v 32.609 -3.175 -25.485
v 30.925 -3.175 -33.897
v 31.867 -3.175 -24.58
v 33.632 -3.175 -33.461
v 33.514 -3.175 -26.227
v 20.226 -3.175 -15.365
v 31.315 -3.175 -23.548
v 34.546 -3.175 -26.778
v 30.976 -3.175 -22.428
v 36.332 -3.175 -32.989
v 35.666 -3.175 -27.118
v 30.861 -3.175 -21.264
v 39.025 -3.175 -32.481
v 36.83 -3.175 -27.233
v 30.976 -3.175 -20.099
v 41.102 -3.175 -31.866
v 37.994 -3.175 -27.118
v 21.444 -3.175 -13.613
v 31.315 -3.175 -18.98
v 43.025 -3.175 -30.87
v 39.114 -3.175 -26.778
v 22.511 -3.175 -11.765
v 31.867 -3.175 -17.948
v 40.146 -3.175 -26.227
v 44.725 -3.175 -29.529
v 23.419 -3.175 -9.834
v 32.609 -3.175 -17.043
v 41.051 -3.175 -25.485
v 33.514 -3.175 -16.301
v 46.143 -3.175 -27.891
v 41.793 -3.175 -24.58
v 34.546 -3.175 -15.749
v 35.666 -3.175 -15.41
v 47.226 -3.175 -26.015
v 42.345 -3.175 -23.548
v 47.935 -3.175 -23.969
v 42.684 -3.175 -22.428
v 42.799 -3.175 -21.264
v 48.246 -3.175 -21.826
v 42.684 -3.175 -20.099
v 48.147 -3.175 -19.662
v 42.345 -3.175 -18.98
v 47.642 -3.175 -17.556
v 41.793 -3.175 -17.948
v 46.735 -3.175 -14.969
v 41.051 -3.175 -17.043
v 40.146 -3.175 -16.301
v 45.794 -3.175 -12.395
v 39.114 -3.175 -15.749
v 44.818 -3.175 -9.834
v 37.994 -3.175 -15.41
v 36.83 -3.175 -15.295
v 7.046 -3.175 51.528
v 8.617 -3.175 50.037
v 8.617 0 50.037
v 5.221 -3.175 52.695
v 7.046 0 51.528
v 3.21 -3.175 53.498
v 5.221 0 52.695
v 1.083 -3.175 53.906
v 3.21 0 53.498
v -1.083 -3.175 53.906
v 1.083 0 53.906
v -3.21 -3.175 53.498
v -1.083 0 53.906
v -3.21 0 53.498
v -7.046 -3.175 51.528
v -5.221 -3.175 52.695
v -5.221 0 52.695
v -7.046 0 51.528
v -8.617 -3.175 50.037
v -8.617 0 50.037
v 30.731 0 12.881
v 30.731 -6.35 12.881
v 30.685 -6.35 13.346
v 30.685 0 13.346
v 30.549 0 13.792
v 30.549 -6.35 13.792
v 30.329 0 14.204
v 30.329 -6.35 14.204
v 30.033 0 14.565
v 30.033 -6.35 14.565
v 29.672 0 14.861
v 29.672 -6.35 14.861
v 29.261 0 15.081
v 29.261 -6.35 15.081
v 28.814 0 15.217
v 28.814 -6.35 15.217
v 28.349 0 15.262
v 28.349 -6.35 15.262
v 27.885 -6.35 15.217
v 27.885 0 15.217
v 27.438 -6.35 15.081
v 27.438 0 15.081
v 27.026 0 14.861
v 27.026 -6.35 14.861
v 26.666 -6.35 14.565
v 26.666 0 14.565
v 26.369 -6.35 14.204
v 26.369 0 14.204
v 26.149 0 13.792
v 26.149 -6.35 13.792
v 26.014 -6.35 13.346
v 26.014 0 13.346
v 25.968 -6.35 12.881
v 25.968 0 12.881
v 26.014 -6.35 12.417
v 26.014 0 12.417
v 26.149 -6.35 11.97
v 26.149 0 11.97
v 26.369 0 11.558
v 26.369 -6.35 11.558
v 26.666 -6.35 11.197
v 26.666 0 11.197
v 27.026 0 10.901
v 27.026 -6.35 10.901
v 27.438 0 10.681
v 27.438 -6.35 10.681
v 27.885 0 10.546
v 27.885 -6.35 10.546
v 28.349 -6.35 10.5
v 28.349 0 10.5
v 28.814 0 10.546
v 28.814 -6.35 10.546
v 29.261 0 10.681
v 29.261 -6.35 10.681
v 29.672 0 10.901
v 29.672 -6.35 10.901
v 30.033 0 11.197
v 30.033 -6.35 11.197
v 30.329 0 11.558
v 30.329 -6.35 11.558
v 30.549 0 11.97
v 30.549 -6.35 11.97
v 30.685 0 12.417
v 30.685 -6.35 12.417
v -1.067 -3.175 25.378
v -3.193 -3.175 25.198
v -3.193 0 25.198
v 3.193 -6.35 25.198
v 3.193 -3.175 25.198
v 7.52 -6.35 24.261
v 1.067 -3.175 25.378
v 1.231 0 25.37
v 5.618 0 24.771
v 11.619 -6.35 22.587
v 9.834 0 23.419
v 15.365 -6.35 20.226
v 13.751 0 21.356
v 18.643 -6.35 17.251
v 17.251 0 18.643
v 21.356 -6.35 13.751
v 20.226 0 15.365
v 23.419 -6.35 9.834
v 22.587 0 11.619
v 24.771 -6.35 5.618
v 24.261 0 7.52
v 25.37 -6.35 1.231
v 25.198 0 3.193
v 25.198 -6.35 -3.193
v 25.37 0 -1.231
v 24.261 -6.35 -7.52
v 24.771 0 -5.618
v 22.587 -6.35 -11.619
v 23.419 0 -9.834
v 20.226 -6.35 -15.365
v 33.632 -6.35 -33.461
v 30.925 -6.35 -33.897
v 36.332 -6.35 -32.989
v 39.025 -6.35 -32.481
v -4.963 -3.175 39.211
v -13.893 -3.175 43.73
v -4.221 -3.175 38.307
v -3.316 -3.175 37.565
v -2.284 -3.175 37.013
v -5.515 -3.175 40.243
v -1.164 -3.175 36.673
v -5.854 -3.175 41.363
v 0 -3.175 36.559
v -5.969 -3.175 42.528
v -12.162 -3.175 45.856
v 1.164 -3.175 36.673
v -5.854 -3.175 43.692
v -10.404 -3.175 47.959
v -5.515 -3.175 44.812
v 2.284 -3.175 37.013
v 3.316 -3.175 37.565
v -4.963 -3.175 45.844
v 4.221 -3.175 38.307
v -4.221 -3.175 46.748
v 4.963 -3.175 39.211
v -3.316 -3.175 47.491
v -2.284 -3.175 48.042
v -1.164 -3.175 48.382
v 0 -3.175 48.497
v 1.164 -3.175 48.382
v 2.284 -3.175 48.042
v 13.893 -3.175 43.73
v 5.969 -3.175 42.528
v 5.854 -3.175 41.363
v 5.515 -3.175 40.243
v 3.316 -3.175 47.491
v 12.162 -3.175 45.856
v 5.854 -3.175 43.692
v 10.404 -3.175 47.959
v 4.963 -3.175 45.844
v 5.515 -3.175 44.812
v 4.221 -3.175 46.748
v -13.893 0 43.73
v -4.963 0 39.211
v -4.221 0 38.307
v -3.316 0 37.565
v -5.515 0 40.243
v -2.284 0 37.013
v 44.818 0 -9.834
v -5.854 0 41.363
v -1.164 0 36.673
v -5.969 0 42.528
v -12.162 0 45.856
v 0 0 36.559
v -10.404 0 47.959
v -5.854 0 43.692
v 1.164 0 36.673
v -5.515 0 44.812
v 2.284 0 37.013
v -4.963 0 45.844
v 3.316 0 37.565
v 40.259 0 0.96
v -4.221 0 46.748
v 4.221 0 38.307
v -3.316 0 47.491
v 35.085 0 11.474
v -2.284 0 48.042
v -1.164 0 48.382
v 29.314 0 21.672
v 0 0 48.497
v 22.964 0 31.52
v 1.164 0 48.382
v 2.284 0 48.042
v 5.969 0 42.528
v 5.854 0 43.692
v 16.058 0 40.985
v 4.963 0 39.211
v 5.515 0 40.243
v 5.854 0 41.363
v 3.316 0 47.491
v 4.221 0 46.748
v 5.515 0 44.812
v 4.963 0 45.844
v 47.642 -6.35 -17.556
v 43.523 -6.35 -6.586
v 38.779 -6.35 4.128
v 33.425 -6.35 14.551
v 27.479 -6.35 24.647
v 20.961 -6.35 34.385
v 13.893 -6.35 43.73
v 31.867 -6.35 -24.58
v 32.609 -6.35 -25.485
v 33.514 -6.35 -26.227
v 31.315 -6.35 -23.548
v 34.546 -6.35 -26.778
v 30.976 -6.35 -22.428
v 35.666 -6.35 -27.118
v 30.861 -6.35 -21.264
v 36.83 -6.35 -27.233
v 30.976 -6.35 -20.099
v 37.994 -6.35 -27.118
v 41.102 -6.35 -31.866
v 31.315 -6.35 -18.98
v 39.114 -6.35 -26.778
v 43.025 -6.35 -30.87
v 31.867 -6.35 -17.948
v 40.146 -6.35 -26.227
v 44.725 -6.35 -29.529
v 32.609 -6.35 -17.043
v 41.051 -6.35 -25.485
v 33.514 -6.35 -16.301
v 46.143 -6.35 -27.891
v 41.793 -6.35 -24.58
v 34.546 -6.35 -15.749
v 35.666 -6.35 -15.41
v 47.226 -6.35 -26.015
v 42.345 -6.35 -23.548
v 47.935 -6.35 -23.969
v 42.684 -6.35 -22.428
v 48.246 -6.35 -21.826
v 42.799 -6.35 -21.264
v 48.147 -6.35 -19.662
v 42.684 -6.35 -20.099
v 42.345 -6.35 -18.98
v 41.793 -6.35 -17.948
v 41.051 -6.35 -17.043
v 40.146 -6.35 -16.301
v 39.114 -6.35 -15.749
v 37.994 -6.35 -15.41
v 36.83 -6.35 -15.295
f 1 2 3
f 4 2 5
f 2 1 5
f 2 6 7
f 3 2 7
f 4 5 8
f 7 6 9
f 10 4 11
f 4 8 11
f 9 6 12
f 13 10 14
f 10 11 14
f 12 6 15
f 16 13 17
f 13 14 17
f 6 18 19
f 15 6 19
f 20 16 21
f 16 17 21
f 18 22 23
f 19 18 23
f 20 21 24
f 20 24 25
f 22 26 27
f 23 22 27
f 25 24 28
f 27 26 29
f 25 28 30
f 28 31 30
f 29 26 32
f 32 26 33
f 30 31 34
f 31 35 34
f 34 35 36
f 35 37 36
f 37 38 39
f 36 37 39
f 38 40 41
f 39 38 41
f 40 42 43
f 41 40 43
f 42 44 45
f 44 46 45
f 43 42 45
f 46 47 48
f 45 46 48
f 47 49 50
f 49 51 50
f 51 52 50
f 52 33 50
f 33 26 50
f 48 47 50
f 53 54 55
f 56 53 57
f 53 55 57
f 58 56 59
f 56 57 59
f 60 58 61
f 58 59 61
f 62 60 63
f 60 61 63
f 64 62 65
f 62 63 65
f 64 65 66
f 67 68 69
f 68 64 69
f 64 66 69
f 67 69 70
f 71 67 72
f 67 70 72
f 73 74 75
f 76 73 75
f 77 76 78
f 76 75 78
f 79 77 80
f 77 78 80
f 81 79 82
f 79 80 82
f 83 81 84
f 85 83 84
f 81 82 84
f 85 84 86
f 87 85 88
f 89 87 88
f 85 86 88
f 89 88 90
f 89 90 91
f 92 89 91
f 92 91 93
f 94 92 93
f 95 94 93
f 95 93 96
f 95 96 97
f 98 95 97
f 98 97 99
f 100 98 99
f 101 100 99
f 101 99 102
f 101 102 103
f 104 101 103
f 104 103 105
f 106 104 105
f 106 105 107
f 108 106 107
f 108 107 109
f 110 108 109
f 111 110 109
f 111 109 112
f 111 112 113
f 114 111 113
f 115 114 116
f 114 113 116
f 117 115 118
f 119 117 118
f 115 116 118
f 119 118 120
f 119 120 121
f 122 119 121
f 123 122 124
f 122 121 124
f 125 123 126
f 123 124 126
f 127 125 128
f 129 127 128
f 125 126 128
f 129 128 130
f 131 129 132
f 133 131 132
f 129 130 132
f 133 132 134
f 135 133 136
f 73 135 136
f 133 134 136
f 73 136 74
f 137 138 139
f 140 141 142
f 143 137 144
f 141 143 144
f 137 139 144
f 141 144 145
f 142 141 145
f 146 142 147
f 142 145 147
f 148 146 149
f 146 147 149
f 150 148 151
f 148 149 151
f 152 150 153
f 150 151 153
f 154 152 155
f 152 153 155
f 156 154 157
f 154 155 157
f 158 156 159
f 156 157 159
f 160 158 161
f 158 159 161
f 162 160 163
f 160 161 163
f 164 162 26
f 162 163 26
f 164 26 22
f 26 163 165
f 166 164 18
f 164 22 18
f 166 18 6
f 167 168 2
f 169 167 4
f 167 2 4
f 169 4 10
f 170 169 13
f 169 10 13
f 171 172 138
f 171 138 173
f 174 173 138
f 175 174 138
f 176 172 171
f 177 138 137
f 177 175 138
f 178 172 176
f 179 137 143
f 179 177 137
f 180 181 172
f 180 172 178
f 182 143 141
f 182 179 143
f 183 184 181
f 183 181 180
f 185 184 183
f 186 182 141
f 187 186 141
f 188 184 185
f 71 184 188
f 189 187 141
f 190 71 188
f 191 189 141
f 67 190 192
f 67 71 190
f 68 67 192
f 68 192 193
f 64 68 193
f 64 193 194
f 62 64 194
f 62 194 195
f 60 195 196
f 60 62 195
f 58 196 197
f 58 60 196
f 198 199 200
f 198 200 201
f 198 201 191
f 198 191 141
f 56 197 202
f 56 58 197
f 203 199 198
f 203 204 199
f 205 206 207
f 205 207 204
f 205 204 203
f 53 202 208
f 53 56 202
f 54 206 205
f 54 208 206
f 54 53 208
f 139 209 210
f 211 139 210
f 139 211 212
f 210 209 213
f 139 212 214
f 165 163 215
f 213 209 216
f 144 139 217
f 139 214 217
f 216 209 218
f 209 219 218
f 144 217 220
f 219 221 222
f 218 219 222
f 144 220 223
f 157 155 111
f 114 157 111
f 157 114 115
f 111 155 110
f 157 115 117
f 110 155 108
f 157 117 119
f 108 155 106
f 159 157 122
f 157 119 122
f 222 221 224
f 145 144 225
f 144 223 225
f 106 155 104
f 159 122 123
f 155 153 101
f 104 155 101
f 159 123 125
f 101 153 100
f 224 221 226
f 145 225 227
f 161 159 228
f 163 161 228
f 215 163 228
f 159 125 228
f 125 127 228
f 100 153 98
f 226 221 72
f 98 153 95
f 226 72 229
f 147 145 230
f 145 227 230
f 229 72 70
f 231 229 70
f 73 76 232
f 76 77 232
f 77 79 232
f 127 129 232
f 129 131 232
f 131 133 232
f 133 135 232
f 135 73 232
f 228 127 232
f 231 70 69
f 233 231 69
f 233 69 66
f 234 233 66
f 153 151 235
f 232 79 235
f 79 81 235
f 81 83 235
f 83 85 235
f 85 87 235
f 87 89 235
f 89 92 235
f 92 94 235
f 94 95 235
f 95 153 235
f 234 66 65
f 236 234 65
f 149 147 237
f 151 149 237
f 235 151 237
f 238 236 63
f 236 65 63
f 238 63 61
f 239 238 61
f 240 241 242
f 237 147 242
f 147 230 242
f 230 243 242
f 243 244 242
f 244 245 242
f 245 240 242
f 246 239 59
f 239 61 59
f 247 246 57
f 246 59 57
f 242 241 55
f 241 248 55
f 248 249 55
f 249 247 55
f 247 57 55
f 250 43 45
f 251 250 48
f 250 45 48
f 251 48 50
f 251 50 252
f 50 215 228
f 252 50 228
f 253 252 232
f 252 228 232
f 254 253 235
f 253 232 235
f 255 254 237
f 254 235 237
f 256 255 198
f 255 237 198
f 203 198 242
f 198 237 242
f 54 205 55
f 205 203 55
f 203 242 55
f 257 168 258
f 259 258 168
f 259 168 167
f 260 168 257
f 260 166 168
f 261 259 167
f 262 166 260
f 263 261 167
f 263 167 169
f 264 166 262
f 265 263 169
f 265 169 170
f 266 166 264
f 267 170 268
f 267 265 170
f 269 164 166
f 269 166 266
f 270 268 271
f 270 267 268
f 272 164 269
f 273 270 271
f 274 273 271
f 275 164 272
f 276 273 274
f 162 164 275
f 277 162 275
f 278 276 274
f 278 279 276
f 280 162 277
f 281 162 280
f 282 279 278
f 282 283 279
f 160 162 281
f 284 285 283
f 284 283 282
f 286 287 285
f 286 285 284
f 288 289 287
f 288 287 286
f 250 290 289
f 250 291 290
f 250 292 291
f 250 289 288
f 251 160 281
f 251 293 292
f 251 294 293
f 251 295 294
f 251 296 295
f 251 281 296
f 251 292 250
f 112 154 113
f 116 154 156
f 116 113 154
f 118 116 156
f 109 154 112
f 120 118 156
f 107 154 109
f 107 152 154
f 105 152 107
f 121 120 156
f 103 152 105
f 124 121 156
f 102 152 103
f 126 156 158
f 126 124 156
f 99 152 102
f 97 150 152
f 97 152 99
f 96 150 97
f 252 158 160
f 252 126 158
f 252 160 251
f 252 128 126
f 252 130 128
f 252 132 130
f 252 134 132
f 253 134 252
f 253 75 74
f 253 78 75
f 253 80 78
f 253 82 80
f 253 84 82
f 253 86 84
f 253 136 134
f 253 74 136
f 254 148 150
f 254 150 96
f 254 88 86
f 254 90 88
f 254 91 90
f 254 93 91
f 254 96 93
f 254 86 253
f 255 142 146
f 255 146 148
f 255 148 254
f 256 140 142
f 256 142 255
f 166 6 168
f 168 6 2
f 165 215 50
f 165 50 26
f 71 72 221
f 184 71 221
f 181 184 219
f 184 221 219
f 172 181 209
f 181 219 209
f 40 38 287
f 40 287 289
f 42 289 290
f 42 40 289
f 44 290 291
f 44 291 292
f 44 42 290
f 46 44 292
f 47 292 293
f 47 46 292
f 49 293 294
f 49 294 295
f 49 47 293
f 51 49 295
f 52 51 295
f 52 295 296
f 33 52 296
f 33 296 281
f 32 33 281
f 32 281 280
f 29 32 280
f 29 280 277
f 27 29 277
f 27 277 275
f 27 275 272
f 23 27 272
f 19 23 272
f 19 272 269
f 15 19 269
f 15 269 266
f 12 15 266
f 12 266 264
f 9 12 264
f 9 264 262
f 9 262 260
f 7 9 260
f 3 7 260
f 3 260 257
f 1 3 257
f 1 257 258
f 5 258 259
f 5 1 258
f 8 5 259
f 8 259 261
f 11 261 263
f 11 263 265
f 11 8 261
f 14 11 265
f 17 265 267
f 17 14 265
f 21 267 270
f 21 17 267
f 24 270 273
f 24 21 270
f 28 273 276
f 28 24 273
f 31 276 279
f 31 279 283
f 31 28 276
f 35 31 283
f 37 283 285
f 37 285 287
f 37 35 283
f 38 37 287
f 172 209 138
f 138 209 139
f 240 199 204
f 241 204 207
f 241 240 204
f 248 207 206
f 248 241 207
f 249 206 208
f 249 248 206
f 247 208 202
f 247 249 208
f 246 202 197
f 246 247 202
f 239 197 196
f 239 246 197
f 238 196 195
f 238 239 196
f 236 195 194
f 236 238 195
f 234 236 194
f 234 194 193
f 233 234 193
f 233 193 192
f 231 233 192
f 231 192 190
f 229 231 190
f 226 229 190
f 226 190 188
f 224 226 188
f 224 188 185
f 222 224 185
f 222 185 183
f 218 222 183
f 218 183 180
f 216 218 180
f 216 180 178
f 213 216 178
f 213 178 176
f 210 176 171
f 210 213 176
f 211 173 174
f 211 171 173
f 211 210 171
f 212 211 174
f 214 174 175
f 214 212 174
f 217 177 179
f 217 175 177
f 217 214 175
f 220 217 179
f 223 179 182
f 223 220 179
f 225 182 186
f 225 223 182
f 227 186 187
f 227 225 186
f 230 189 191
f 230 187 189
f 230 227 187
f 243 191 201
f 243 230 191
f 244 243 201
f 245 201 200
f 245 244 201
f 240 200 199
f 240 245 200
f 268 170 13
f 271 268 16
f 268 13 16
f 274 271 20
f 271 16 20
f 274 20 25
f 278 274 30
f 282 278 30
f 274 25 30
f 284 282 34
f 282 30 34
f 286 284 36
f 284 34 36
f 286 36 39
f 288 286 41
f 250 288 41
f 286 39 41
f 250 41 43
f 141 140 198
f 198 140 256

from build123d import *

# Parameters (mm, degrees)
F0_R     = 5.969
F1_DEPTH = 6.35
F3_DEPTH = 3.175
F4_R     = 5.969
F5_DEPTH = 3.175
F6_R     = 2.38125
F7_DEPTH = 25.4


with BuildPart() as f1:
    # F0 (on Front) → F1 (new body)
    with BuildSketch(Plane.XZ):
        with BuildLine():
            ThreePointArc((-3.193241, 25.198476), (21.997045, 12.7), (20.2259, -15.364666))
            Line((20.2259, -15.364666), (30.925328, -33.896619))
            ThreePointArc((30.925328, -33.896619), (34.982408, -33.229802), (39.025166, -32.481036))
            ThreePointArc((39.025166, -32.481036), (46.72867, -26.97881), (47.641985, -17.556267))
            ThreePointArc((47.641985, -17.556267), (31.40528, 18.131847), (8.616819, 50.037303))
            ThreePointArc((8.616819, 50.037303), (0, 53.957621), (-8.616819, 50.037303))
            ThreePointArc((-8.616819, 50.037303), (-11.286649, 46.910555), (-13.892669, 43.73043))
            Line((-13.892669, 43.73043), (-3.193241, 25.198476))
        make_face()
        with Locations((36.83, -21.26381)):
            Circle(F0_R, mode=Mode.SUBTRACT)
        with Locations((0, 42.527621)):
            Circle(F0_R, mode=Mode.SUBTRACT)
    extrude(amount=F1_DEPTH)

    # F2 (on face) → F3 (cut)
    with BuildSketch(Plane.XZ.offset(6.35)):
        Polygon((-39.208766, 26.267834), (-6.944216, 7.639887), (20.571818, 55.299056), (-11.692732, 73.927002), align=None)
    extrude(amount=-F3_DEPTH, mode=Mode.SUBTRACT)

    # F4 (on face) → F5 (cut)
    with BuildSketch(Plane.XZ):
        with Locations((36.83, -21.26381)):
            Circle(F4_R)
        with BuildLine():
            Line((65.582015, -59.232034), (65.582015, -9.83381))
            Line((65.582015, -9.83381), (44.817998, -9.83381))
            ThreePointArc((44.817998, -9.83381), (46.269057, -13.680753), (47.641985, -17.556267))
            ThreePointArc((47.641985, -17.556267), (46.72867, -26.97881), (39.025166, -32.481036))
            ThreePointArc((39.025166, -32.481036), (34.982408, -33.229802), (30.925328, -33.896619))
            Line((30.925328, -33.896619), (20.2259, -15.364666))
            ThreePointArc((20.2259, -15.364666), (21.997045, -12.7), (23.419141, -9.83381))
            Line((23.419141, -9.83381), (1.765535, -9.83381))
            Line((1.765535, -9.83381), (1.765535, -59.232034))
            Line((1.765535, -59.232034), (65.582015, -59.232034))
        make_face()
        with BuildLine():
            ThreePointArc((47.641985, -17.556267), (46.269057, -13.680753), (44.817998, -9.83381))
            Line((44.817998, -9.83381), (23.419141, -9.83381))
            ThreePointArc((23.419141, -9.83381), (21.997045, -12.7), (20.2259, -15.364666))
            Line((20.2259, -15.364666), (30.925328, -33.896619))
            ThreePointArc((30.925328, -33.896619), (34.982408, -33.229802), (39.025166, -32.481036))
            ThreePointArc((39.025166, -32.481036), (46.72867, -26.97881), (47.641985, -17.556267))
        make_face()
        with Locations((36.83, -21.26381)):
            Circle(F4_R, mode=Mode.SUBTRACT)
    extrude(amount=F5_DEPTH, mode=Mode.SUBTRACT)

    # F6 (on face) → F7 (cut)
    with BuildSketch(Plane.XZ.offset(6.35)):
        with Locations((28.349303, 12.88107)):
            Circle(F6_R)
    extrude(amount=-F7_DEPTH, mode=Mode.SUBTRACT)


solid = f1.part
